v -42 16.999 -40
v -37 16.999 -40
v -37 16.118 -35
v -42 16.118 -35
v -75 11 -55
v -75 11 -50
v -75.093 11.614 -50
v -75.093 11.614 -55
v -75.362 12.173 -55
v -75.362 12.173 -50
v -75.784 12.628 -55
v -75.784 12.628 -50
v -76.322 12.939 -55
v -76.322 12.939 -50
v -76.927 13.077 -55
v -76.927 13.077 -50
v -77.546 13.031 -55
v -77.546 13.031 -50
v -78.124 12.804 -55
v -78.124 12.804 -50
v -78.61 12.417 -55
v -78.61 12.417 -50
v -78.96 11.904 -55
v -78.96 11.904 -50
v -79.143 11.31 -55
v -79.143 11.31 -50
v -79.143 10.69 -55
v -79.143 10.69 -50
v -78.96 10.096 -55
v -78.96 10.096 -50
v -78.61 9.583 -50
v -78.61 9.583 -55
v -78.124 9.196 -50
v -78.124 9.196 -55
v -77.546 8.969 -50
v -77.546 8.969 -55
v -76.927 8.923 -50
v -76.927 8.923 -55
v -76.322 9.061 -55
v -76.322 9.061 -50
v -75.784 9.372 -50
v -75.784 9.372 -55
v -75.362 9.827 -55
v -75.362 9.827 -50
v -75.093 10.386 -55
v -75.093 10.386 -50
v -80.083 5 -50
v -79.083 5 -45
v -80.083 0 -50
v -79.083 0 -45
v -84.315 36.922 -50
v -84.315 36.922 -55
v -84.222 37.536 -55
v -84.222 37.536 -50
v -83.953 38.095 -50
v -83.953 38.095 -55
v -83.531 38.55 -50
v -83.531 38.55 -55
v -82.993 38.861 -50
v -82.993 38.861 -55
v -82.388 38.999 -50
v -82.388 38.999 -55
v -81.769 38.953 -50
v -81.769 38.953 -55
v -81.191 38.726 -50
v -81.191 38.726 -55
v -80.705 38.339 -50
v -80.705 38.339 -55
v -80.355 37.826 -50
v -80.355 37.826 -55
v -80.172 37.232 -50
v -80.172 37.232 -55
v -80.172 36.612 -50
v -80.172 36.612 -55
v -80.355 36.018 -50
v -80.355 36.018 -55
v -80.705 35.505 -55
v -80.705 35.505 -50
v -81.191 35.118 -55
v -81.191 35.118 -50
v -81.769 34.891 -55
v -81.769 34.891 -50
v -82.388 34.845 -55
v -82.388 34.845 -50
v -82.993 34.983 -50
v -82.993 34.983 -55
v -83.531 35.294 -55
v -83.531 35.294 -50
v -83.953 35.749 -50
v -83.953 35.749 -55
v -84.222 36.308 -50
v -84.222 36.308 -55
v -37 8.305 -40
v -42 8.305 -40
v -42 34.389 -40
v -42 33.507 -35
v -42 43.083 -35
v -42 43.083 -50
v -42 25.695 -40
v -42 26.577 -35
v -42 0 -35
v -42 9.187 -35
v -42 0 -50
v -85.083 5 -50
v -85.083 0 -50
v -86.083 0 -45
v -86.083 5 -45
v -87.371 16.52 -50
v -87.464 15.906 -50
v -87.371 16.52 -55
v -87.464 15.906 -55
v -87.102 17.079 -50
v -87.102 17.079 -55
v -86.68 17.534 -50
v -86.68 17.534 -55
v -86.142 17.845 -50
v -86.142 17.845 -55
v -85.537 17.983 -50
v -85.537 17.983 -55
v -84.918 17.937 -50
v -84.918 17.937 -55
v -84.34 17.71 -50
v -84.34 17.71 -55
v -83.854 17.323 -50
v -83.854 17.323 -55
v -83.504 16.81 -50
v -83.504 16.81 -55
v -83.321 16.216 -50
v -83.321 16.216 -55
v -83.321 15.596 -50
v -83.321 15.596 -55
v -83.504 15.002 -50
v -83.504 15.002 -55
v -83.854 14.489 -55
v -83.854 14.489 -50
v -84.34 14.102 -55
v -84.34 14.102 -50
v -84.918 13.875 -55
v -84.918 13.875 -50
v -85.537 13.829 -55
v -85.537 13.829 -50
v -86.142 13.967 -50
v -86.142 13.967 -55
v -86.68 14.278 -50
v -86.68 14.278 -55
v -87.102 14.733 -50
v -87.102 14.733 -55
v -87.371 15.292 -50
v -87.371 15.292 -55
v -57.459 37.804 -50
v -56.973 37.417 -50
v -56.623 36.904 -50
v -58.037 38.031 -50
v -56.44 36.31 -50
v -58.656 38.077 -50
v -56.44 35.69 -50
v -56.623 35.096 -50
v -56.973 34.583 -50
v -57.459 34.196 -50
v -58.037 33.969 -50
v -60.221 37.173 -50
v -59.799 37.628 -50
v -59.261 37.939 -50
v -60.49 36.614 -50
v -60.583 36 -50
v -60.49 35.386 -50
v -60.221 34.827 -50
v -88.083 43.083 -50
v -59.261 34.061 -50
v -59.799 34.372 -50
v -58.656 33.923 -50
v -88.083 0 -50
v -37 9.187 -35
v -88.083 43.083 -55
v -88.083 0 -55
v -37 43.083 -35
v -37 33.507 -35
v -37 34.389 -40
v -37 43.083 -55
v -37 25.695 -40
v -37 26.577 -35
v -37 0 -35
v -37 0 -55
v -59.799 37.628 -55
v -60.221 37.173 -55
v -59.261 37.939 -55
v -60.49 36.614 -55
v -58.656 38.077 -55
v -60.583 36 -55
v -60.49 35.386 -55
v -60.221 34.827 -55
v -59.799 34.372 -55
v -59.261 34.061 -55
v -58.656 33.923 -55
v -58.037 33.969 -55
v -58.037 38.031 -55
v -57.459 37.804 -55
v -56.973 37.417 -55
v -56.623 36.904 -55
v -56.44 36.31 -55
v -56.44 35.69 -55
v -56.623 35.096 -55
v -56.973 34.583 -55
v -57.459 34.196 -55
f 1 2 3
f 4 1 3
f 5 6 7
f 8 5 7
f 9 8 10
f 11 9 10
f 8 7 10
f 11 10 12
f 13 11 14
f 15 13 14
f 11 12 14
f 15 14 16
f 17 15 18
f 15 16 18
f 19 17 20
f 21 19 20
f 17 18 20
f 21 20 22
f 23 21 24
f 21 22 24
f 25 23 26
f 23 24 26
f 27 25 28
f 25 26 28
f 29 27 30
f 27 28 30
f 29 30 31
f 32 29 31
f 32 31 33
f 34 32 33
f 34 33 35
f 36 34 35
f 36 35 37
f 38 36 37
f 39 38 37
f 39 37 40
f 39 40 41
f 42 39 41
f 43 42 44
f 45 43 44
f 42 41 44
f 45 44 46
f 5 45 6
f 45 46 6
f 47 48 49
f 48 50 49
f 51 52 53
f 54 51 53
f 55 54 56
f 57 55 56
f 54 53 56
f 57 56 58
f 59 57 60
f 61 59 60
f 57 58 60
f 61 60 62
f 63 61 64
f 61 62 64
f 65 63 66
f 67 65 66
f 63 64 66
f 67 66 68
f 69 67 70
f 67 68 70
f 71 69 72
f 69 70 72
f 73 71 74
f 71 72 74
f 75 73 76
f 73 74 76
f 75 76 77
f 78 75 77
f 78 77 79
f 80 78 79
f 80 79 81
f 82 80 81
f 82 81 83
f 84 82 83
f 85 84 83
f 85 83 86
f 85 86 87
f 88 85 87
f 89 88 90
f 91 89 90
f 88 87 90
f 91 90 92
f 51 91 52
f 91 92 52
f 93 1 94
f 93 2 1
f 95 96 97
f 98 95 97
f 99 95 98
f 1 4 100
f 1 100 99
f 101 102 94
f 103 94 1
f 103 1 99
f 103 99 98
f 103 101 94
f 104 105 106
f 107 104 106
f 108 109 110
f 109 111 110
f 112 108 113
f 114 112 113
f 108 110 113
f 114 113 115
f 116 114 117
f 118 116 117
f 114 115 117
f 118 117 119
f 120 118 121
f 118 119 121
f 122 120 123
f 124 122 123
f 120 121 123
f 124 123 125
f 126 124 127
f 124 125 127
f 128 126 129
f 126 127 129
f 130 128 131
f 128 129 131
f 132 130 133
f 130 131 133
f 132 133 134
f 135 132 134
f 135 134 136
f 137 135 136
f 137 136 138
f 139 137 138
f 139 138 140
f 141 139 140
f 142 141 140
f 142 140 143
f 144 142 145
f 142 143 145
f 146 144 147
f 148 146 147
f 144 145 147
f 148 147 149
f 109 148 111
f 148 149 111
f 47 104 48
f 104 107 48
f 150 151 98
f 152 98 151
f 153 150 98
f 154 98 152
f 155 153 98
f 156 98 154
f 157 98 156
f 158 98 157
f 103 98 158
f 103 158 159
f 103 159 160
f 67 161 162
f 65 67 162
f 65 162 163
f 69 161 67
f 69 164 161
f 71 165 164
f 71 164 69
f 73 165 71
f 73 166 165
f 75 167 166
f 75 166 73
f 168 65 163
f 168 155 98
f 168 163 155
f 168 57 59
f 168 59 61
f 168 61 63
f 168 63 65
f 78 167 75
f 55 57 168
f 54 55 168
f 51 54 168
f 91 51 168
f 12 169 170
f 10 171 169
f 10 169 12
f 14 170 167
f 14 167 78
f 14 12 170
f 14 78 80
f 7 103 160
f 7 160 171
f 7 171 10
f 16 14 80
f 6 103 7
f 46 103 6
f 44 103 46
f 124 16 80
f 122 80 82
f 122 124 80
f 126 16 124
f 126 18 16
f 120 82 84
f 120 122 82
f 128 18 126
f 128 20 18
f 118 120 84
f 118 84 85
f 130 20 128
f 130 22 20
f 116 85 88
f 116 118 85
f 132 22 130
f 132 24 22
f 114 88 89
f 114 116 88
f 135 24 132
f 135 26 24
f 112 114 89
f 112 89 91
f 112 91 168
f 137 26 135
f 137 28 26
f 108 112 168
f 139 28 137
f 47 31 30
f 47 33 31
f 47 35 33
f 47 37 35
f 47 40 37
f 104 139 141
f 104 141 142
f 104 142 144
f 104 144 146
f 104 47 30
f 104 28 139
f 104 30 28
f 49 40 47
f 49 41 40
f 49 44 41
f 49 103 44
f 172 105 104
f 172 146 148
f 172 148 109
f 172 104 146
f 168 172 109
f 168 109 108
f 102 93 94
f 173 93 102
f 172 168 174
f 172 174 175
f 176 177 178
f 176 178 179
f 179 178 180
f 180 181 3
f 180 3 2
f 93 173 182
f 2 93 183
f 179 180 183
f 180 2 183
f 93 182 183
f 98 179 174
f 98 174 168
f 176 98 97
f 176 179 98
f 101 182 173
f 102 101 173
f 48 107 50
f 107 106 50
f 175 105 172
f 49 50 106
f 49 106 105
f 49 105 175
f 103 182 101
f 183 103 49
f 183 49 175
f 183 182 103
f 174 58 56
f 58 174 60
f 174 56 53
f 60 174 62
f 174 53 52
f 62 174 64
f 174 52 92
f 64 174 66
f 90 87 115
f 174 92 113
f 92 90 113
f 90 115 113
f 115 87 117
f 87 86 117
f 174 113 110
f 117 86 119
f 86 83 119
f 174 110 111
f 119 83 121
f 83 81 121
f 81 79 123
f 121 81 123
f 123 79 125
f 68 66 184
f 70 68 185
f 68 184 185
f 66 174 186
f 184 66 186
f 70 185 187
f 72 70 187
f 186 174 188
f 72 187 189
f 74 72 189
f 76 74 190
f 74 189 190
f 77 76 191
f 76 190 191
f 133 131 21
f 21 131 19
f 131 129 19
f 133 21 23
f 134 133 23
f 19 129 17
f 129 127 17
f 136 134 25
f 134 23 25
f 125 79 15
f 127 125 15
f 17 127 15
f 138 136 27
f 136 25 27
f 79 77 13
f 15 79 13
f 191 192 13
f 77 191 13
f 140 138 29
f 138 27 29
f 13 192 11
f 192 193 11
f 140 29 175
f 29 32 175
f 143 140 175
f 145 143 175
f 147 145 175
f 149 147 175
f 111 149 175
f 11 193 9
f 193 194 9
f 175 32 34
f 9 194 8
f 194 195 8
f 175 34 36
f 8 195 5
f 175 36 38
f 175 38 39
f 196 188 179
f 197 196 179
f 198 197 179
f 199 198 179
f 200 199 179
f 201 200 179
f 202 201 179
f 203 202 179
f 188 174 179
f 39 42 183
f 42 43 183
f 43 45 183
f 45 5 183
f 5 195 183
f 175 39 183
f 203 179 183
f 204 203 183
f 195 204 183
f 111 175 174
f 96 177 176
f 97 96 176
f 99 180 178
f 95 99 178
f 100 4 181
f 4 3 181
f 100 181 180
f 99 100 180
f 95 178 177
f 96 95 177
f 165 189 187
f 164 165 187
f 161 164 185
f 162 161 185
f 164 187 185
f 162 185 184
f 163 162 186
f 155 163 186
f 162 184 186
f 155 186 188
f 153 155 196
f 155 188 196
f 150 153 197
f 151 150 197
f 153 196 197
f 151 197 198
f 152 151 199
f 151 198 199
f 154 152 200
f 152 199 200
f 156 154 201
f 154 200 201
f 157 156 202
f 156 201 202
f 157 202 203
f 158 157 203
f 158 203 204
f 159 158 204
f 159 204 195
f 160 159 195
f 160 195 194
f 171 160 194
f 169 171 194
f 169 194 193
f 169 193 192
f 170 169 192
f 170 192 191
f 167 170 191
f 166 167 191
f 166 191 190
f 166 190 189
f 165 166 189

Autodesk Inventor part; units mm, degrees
ref_plane "YZ Plane" through (0, 0, 0) normal (1, 0, 0) x (0, 1, 0)
ref_plane "XZ Plane" through (0, 0, 0) normal (0, 1, 0) x (-1, 0, 0)
ref_plane "XY Plane" through (0, 0, 0) normal (0, 0, 1) x (1, 0, 0)
sketch "Sketch1" plane through (0, 0, 0) normal (0, 1, 0) x (-1, 0, 0)
  line L0 (0, 0) -> (0, -35)
  line L1 (0, -35) -> (37, -35)
  line L2 (37, -35) -> (37, -55)
  line L3 (37, -55) -> (48, -55)
  line L4 (48, -55) -> (48, 0)
  line L5 (48, 0) -> (22, 0)
  line L6 (22, 0) -> (22, 0)
  line L7 (22, 0) -> (0, 0)
  dimension "d0" = 35
  dimension "d1" = 37
  dimension "d2" = 20
  dimension "d3" = 11
  dimension "d4" = 55
  dimension "d5" = 26
  dimension "d6" = 0
extrude "Extrusion1" add sketch "Sketch1" along normal blind 50
shell "Shell1" thickness 5 removed faces 3 at (-48, 16.6667, -36.6667) at (-19.6667, 0, -23.3333) at (-19.6667, 50, -23.3333)
sketch "Sketch2" plane through (0, 0, 0) normal (1, 0, 0) x (0, 0, -1)
  line L0 (5, 0) -> (30, 0) projected
  line L1 (5, 0) -> (19, 0)
  line L2 (19, 0) -> (19, 17)
  line L3 (19, 17) -> (5, 17)
  line L4 (5, 17) -> (5, 0)
  point P0 (0, 0)
  dimension "d10" = 17
  dimension "d11" = 0
  dimension "d12" = 11
extrude "Extrusion2" cut sketch "Sketch2" against normal blind 10
sketch "Sketch3" plane through (-48, 0, -55) normal (-1, 0, 0) x (0, 0, 1)
  line L0 (0, 0) -> (0, 50) projected
  line L1 (5, 50) -> (25, 50) projected
  line L2 (0, 0) -> (5, 0)
  line L3 (5, 0) -> (5, 50)
  line L4 (5, 50) -> (0, 50)
  line L5 (0, 50) -> (0, 0)
  point P0 (55, 0)
extrude "Extrusion3" add sketch "Sketch3" along normal blind 15
sketch "Sketch4" plane through (-48, 0, 0) normal (-1, 0, 0) x (0, 0, 1)
  line L0 (-5, 0) -> (0, 0) projected
  line L1 (-5, 0) -> (-5, 50) projected
  line L2 (0, 0) -> (-5, 0)
  line L3 (-5, 0) -> (-5, 50)
  line L4 (-5, 50) -> (0, 50)
  line L5 (0, 50) -> (0, 0)
  point P0 (0, 0)
extrude "Extrusion4" add sketch "Sketch4" along normal blind 15
sketch "Sketch5" plane through (0, 17, -5) normal (0, 0, -1) x (-1, 0, 0)
  circle A0 centre (11.5, -8.5) radius 2.0828
  line L0 (63, -17) -> (0, -17) projected
  line L1 (0, -17) -> (0, 0) projected
  dimension "d19" = 4.1656
  dimension "d20" = 8.5
  dimension "d21" = 11.5
extrude "Extrusion5" cut sketch "Sketch5" against normal blind 15
sketch "Sketch6" plane through (0, 17, -5) normal (0, 0, -1) x (-1, 0, 0)
  circle A0 centre (28.505, 18.46) radius 2.0828
  line L0 (63, -17) -> (0, -17) projected
  line L1 (5, 0) -> (5, 33) projected
  dimension "d24" = 4.1656
  dimension "d25" = 35.46
  dimension "d26" = 23.505
extrude "Extrusion6" cut sketch "Sketch6" against normal blind 15
sketch "Sketch7" plane through (0, 17, -5) normal (0, 0, -1) x (-1, 0, 0)
  circle A0 centre (58.5, 19) radius 2.0828
  line L0 (63, 33) -> (63, -17) projected
  line L1 (5, 33) -> (63, 33) projected
  point P0 (0, -17)
  dimension "d29" = 4.1656
  dimension "d30" = 4.5
  dimension "d31" = 14
extrude "Extrusion7" cut sketch "Sketch7" against normal blind 15
sketch "Sketch13" plane through (0, 0, -35) normal (0, 0, -1) x (-1, 0, 0)
  circle A0 centre (11.5, 8.5) radius 2.0828
  line L0 (0, 0) -> (37, 0) projected
  line L1 (0, 0) -> (0, 50) projected
  dimension "d41" = 4.1656
  dimension "d42" = 8.5
  dimension "d43" = 11.5
extrude "Extrusion9" cut sketch "Sketch13" against normal blind 15
sketch "Sketch14" plane through (-37, 0, -55) normal (0, 0, -1) x (-1, 0, 0)
  circle A0 centre (-8.495, 35.46) radius 2.0828
  line L0 (-37, 0) -> (-37, 50) projected
  line L1 (0, 0) -> (26, 0) projected
  dimension "d46" = 4.1656
  dimension "d47" = 28.505
  dimension "d48" = 35.46
extrude "Extrusion10" cut sketch "Sketch14" against normal blind 15
sketch "Sketch15" plane through (-37, 0, -55) normal (0, 0, -1) x (-1, 0, 0)
  circle A0 centre (21.5, 36) radius 2.0828
  line L0 (0, 0) -> (26, 0) projected
  line L1 (26, 50) -> (26, 0) projected
  point P0 (-37, 0)
  dimension "d51" = 4.1656
  dimension "d52" = 36
  dimension "d53" = 4.5
extrude "Extrusion11" cut sketch "Sketch15" against normal blind 15
sketch "Sketch16" plane through (-42, 0, -30) normal (-1, 0, 0) x (0, 0, 1)
  line L0 (0, 0) -> (-5, 0)
  line L1 (-5, 0) -> (-5, 50)
  line L2 (-5, 50) -> (0, 50)
  line L3 (0, 50) -> (0, 0)
  point P0 (30, 0)
  dimension "d56" = 5
  dimension "d57" = 50
extrude "Extrusion12" add sketch "Sketch16" along normal blind 21
sketch "Sketch17" plane through (-5, 0, -30) normal (0, 0, 1) x (1, 0, 0)
  circle A0 centre (-23.505, 35.46) radius 2.0828
  line L0 (0, 0) -> (0, 50) projected
  line L1 (0, 0) -> (-58, 0) projected
  point P0 (5, 0)
  dimension "d60" = 4.1656
  dimension "d61" = 23.505
  dimension "d62" = 35.46
extrude "Extrusion13" cut sketch "Sketch17" against normal blind 10
sketch "Sketch18" plane through (-42, 0, -35) normal (0, 0, -1) x (-1, 0, 0)
  circle A0 centre (16.5, 36) radius 2.0828
  line L0 (21, 50) -> (21, 0) projected
  line L1 (0, 0) -> (21, 0) projected
  point P0 (-42, 0)
  dimension "d65" = 4.1656
  dimension "d67" = 36
  dimension "d70" = 4.5
extrude "Extrusion14" cut sketch "Sketch18" against normal blind 10
sketch "Sketch20" plane through (-63, 0, 0) normal (-1, 0, 0) x (0, 0, 1)
  line L0 (0, 0) -> (-5, 0) projected
  line L1 (-5, 17) -> (-5, 50) projected
  line L2 (0, 0) -> (-5, 0)
  line L3 (-5, 0) -> (-5, 50)
  line L4 (-5, 50) -> (0, 50)
  line L5 (0, 50) -> (0, 0)
extrude "Extrusion15" add sketch "Sketch20" along normal blind 2.583
sketch "Sketch21" plane through (-63, 0, -30) normal (-1, 0, 0) x (0, 0, 1)
  line L0 (-20, 50) -> (-5, 50) projected
  line L1 (11, 0) -> (0, 0) projected
  line L2 (-5, 50) -> (0, 50)
  line L3 (0, 50) -> (0, 0)
  line L4 (0, 0) -> (-5, 0)
  line L5 (-5, 0) -> (-5, 50)
  point P0 (30, 0)
extrude "Extrusion16" add sketch "Sketch21" along normal blind 2.583
sketch "Sketch22" plane through (-63, 0, -55) normal (-1, 0, 0) x (0, 0, 1)
  line L0 (0, 0) -> (0, 50) projected
  line L1 (5, 0) -> (5, 50) projected
  line L2 (0, 50) -> (5, 50)
  line L3 (5, 50) -> (5, 0)
  line L4 (5, 0) -> (0, 0)
  line L5 (0, 0) -> (0, 50)
  point P0 (55, 0)
extrude "Extrusion17" add sketch "Sketch22" along normal blind 2.583
sketch "Sketch23" plane through (0, 0, 0) normal (0, 0, 1) x (1, 0, 0)
  line L0 (0, 50) -> (-37, 50) projected
  line L1 (-65.583, 50) -> (-65.583, 0) projected
  line L2 (0, 50) -> (-65.583, 50)
  line L3 (-65.583, 50) -> (-65.583, 43.083)
  line L4 (-65.583, 43.083) -> (0, 43.083)
  line L5 (0, 43.083) -> (0, 50)
  point P0 (0, 0)
  dimension "d77" = 6.917
extrude "Extrusion18" cut sketch "Sketch23" against normal blind 100
sketch "Sketch24" plane through (0, 0, -35) normal (0, 0, -1) x (-1, 0, 0)
  line L0 (0, 0) -> (65.583, 0) projected
  line L1 (31.0052, 0) -> (26.0052, 0)
  line L2 (26.0052, 5) -> (31.0052, 5)
  circle A0 centre (28.505, 35.46) radius 2.0828 projected
  line L3 (26.0052, 5) -> (25.0052, 5)
  line L4 (25.0052, 5) -> (26.0052, 0)
  line L5 (31.0052, 5) -> (32.0052, 5)
  line L6 (32.0052, 5) -> (31.0052, 0)
  dimension "d80" = 5
  dimension "d81" = 5
  dimension "d83" = 1
  dimension "d84" = 1
extrude "Extrusion19" cut sketch "Sketch24" against normal blind 100 contours L4 L3 L2 L5 L6 L0
sketch "Sketch25" plane through (-65.583, 0, -55) normal (-1, 0, 0) x (0, 0, 1)
  line L0 (20, 0) -> (0, 0) projected
  line L1 (0, 43.083) -> (20, 43.083) projected
  line L2 (0, 0) -> (5, 0)
  line L3 (5, 0) -> (5, 43.083)
  line L4 (5, 43.083) -> (0, 43.083)
  line L5 (0, 43.083) -> (0, 0)
  point P0 (55, 0)
  dimension "d87" = 5
extrude "Extrusion20" add sketch "Sketch25" along normal blind 22.5
sketch "Sketch28" plane through (-65.583, 0, -30) normal (-1, 0, 0) x (0, 0, 1)
  line L0 (0, 0) -> (-5, 0) projected
  line L1 (-5, 0) -> (-5, 43.083) projected
  line L2 (0, 0) -> (-5, 0)
  line L3 (-5, 0) -> (-5, 43.083)
  line L4 (-5, 43.083) -> (0, 43.083)
  line L5 (0, 43.083) -> (0, 0)
  point P0 (30, 0)
extrude "Extrusion23" add sketch "Sketch28" along normal blind 22.5
sketch "Sketch26" plane through (-37, 0, -55) normal (0, 0, -1) x (-1, 0, 0)
  circle A0 centre (45.232, 36.922) radius 2.0828
  line L0 (51.083, 43.083) -> (51.083, 0) projected
  line L1 (51.083, 43.083) -> (0, 43.083) projected
  point P0 (-37, 0)
  dimension "d90" = 4.1656
  dimension "d91" = 5.851
  dimension "d92" = 6.161
extrude "Extrusion21" cut sketch "Sketch26" against normal blind 25
sketch "Sketch27" plane through (-37, 0, -55) normal (0, 0, -1) x (-1, 0, 0)
  circle A0 centre (48.381, 15.906) radius 2.0828
  line L0 (51.083, 43.083) -> (51.083, 0) projected
  line L1 (0, 0) -> (51.083, 0) projected
  point P0 (-37, 0)
  dimension "d95" = 4.1656
  dimension "d96" = 2.702
  dimension "d97" = 15.906
extrude "Extrusion22" cut sketch "Sketch27" against normal blind 25
sketch "Sketch29" plane through (-42, 0, -35) normal (0, 0, -1) x (-1, 0, 0)
  circle A0 centre (43.381, 15.906) radius 2.0828 projected
  arc A1 (46.083, 19.6075) -> (46.083, 12.2045) centre (43.381, 15.906) ccw
  line L0 (46.083, 43.083) -> (46.083, 0) projected
  line L1 (46.083, 19.6075) -> (46.083, 12.2045)
  point P0 (-42, 0)
  dimension "d102" = 2.5
extrude "Extrusion24" add sketch "Sketch29" along normal up to next
sketch "Sketch30" plane through (-88.083, 0, -55) normal (-1, 0, 0) x (0, 0, 1)
  line L0 (9, 19.6075) -> (21, 19.6075)
  line L1 (21, 19.6075) -> (21, 5)
  line L2 (21, 5) -> (9, 5)
  line L3 (9, 5) -> (9, 19.6075)
  line L4 (0, 43.083) -> (0, 0) projected
  line L5 (25, 0) -> (25, 43.083) projected
  line L6 (0, 0) -> (5, 0) projected
  line L7 (20, 19.6075) -> (5, 19.6075) projected
  point P0 (55, 0)
  dimension "d105" = 9
  dimension "d106" = 4
  dimension "d107" = 5
  dimension "d108" = 0
extrude "Extrusion25" add sketch "Sketch30" along normal blind 30
sketch "Sketch31" plane through (-88.083, 5, -34) normal (0, 0, 1) x (1, 0, 0)
  circle A0 centre (-23.917, 4) radius 2.0828
  line L0 (-30, 0) -> (-30, 14.6075) projected
  line L1 (0, 0) -> (-30, 0) projected
  point P0 (88.083, -5)
  dimension "d111" = 4.1656
  dimension "d112" = 6.083
  dimension "d113" = 4
extrude "Extrusion26" cut sketch "Sketch31" against normal blind 30
sketch "Sketch33" plane through (-88.083, 5, -34) normal (0, 0, 1) x (1, 0, 0)
  circle A0 centre (-23.917, 4) radius 2.0828 projected
  arc A1 (-25.0228, 9.9816) -> (-30, 4) centre (-23.917, 4) ccw
  line L0 (-30, 14.6075) -> (-30, 0) projected
  line L1 (-30, 0) -> (-30, 14.6075) projected
  line L2 (0, 14.6075) -> (-30, 14.6075) projected
  line L3 (-30, 4) -> (-30, 14.6075)
  line L4 (0, 14.6075) -> (-30, 14.6075) projected
  line L5 (-30, 14.6075) -> (0, 14.6075)
  line L6 (0, 14.6075) -> (-25.0228, 9.9816)
  point P0 (88.083, -5)
extrude "Extrusion27" cut sketch "Sketch33" against normal blind 30 contours A1 L0 L2 L6
sketch "Sketch34" plane through (-118.083, 5, -34) normal (0, 0, 1) x (1, 0, 0)
  circle A0 centre (6.083, 4) radius 2.0828 projected
  line L0 (0, 0) -> (0, 4) projected
  arc A1 (0, 4) -> (1.5001, 0) centre (6.083, 4) ccw
  line L1 (30, 0) -> (0, 0) projected
  line L2 (1.5001, 0) -> (0, 0)
  arc A2 (4.9772, 9.9816) -> (0, 4) centre (6.083, 4) ccw projected
  line L3 (0, 0) -> (0, 4)
  point P0 (118.083, -5)
extrude "Extrusion28" cut sketch "Sketch34" against normal blind 30 contours L0 A1 L1
sketch "Sketch35" plane through (-88.083, 5, -46) normal (0, -1, 0) x (1, 0, 0)
  line L0 (0, 12) -> (0, 11) projected
  line L1 (0, 0) -> (-28.4999, 0) projected
  line L2 (0, 11) -> (0, 0)
  line L3 (0, 0) -> (7.2848, 11)
  line L4 (7.2848, 11) -> (7.2848, -4) projected
  line L5 (0, 11) -> (7.2848, 11)
  line L6 (46.083, 11) -> (0, 11) projected
  point P0 (88.083, 46)
extrude "Extrusion29" add sketch "Sketch35" against normal up to next
sketch "Sketch36" plane through (0, 0, 0) normal (1, 0, 0) x (0, 0, -1)
  line L0 (30, 43.083) -> (35, 43.083) projected
  line L1 (0, 0) -> (5, 0) projected
  line L2 (30, 43.083) -> (0, 43.083)
  line L3 (0, 43.083) -> (0, 0)
  line L4 (0, 0) -> (30, 0)
  line L5 (30, 0) -> (30, 43.083)
extrude "Extrusion30" cut sketch "Sketch36" against normal through all
sketch "Sketch37" plane through (0, 43.083, -35) normal (0, 0, -1) x (-1, 0, 0)
  line L0 (5, -8.694) -> (5, -17.3883)
  line L1 (5, -17.3883) -> (0, -16.5067)
  line L2 (5, -8.694) -> (0, -9.5756)
  line L3 (5, -8.694) -> (10.0771, -8.694) construction
  line L4 (0, -9.5756) -> (0, -16.5067)
  line L5 (0, -43.083) -> (0, 0) projected
  line L6 (0, -43.083) -> (26.0052, -43.083) projected
  dimension "d124" = 8.6943
  dimension "d125" = 80
  dimension "d126" = 170
  dimension "d127" = 5
  dimension "d130" = 0
  dimension "d131" = 34.389
extrude "Extrusion31" cut sketch "Sketch37" against normal blind 10
sketch "Sketch38" plane through (0, 0, -30) normal (1, 0, 0) x (0, 0, -1)
  line L0 (0, 0) -> (0, 43.083) projected
  line L1 (0, 43.083) -> (5, 43.083) projected
  line L2 (0, 0) -> (5, 0)
  line L3 (5, 0) -> (5, 43.083)
  line L4 (5, 43.083) -> (0, 43.083)
  line L5 (0, 43.083) -> (0, 0)
  point P0 (-30, 0)
extrude "Extrusion32" cut sketch "Sketch38" against normal through all
sketch "Sketch39" plane through (-37, 0, -55) normal (1, 0, 0) x (0, 0, -1)
  line L0 (-15, 16.9993) -> (-15, 8.305)
  line L1 (-15, 8.305) -> (-20, 9.1866)
  line L2 (-15, 16.9993) -> (-20, 16.1177)
  line L3 (-15, 16.9993) -> (-9.9229, 16.9993) construction
  line L4 (-20, 16.1177) -> (-20, 9.1866)
  line L5 (-20, 0) -> (-20, 43.083) projected
  line L6 (-20, 0) -> (0, 0) projected
  dimension "d136" = 8.6943
  dimension "d137" = 80
  dimension "d138" = 170
  dimension "d139" = 5
  dimension "d142" = 0
  dimension "d143" = 8.305
extrude "Extrusion33" cut sketch "Sketch39" against normal blind 10
sketch "Sketch41" plane through (-37, 0, -55) normal (1, 0, 0) x (0, 0, -1)
  line L0 (-20, 16.1177) -> (-20, 43.083) projected
  line L1 (-20, 26.5766) -> (-15, 25.695)
  line L2 (-15, 25.695) -> (-15, 34.389)
  line L3 (-15, 34.389) -> (-20, 33.5074)
  line L4 (-20, 26.5766) -> (-20, 33.5074)
  line L5 (-20, 16.1177) -> (-15, 16.9993) projected
  line L6 (-15, 8.305) -> (-20, 9.1866) projected
  line L7 (-15, 16.9993) -> (-15, 8.305) projected
  line L8 (0, 43.083) -> (-20, 43.083) projected
  dimension "d153" = 8.694
  dimension "d154" = 8.694
extrude "Extrusion34" cut sketch "Sketch41" against normal blind 10
sketch "Sketch43" plane through (0, 0, 0) normal (0, -1, 0) x (1, 0, 0)
  line L0 (-76.4367, -50) -> (-120.3771, -50)
  line L1 (-120.3771, -50) -> (-120.3771, -27.7218)
  line L2 (-120.3771, -27.7218) -> (-76.4367, -27.7218)
  line L3 (-76.4367, -27.7218) -> (-76.4367, -50)
  line L4 (-42, -50) -> (-88.083, -50) projected
  point P0 (0, 0)
  dimension "d157" = 0
extrude "Extrusion35" cut sketch "Sketch43" against normal blind 50
sketch "Sketch44" plane through (-42, 0, -50) normal (0, 0, 1) x (1, 0, 0)
  circle A0 centre (-35.083, 11) radius 2.0828
  line L0 (-46.083, 0) -> (-46.083, 43.083) projected
  line L1 (0, 0) -> (-46.083, 0) projected
  point P0 (42, 0)
  dimension "d160" = 4.1656
  dimension "d161" = 11
  dimension "d162" = 11
extrude "Extrusion36" cut sketch "Sketch44" against normal blind 50
sketch "Sketch45" plane through (0, 0, 0) normal (0, -1, 0) x (1, 0, 0)
  line L0 (-42, -50) -> (-88.083, -50) projected
  line L1 (-85.083, -50) -> (-86.083, -45)
  line L2 (-86.083, -45) -> (-79.083, -45)
  line L3 (-79.083, -45) -> (-80.083, -50)
  line L4 (-85.083, -50) -> (-80.083, -50)
  line L5 (-88.083, -55) -> (-88.083, -50) projected
  point P0 (0, 0)
  dimension "d165" = 3
  dimension "d166" = 5
  dimension "d167" = 1
  dimension "d168" = 7
  dimension "d169" = 5
extrude "Extrusion37" add sketch "Sketch45" against normal blind 5
properties part number "Frame VG01-05"
